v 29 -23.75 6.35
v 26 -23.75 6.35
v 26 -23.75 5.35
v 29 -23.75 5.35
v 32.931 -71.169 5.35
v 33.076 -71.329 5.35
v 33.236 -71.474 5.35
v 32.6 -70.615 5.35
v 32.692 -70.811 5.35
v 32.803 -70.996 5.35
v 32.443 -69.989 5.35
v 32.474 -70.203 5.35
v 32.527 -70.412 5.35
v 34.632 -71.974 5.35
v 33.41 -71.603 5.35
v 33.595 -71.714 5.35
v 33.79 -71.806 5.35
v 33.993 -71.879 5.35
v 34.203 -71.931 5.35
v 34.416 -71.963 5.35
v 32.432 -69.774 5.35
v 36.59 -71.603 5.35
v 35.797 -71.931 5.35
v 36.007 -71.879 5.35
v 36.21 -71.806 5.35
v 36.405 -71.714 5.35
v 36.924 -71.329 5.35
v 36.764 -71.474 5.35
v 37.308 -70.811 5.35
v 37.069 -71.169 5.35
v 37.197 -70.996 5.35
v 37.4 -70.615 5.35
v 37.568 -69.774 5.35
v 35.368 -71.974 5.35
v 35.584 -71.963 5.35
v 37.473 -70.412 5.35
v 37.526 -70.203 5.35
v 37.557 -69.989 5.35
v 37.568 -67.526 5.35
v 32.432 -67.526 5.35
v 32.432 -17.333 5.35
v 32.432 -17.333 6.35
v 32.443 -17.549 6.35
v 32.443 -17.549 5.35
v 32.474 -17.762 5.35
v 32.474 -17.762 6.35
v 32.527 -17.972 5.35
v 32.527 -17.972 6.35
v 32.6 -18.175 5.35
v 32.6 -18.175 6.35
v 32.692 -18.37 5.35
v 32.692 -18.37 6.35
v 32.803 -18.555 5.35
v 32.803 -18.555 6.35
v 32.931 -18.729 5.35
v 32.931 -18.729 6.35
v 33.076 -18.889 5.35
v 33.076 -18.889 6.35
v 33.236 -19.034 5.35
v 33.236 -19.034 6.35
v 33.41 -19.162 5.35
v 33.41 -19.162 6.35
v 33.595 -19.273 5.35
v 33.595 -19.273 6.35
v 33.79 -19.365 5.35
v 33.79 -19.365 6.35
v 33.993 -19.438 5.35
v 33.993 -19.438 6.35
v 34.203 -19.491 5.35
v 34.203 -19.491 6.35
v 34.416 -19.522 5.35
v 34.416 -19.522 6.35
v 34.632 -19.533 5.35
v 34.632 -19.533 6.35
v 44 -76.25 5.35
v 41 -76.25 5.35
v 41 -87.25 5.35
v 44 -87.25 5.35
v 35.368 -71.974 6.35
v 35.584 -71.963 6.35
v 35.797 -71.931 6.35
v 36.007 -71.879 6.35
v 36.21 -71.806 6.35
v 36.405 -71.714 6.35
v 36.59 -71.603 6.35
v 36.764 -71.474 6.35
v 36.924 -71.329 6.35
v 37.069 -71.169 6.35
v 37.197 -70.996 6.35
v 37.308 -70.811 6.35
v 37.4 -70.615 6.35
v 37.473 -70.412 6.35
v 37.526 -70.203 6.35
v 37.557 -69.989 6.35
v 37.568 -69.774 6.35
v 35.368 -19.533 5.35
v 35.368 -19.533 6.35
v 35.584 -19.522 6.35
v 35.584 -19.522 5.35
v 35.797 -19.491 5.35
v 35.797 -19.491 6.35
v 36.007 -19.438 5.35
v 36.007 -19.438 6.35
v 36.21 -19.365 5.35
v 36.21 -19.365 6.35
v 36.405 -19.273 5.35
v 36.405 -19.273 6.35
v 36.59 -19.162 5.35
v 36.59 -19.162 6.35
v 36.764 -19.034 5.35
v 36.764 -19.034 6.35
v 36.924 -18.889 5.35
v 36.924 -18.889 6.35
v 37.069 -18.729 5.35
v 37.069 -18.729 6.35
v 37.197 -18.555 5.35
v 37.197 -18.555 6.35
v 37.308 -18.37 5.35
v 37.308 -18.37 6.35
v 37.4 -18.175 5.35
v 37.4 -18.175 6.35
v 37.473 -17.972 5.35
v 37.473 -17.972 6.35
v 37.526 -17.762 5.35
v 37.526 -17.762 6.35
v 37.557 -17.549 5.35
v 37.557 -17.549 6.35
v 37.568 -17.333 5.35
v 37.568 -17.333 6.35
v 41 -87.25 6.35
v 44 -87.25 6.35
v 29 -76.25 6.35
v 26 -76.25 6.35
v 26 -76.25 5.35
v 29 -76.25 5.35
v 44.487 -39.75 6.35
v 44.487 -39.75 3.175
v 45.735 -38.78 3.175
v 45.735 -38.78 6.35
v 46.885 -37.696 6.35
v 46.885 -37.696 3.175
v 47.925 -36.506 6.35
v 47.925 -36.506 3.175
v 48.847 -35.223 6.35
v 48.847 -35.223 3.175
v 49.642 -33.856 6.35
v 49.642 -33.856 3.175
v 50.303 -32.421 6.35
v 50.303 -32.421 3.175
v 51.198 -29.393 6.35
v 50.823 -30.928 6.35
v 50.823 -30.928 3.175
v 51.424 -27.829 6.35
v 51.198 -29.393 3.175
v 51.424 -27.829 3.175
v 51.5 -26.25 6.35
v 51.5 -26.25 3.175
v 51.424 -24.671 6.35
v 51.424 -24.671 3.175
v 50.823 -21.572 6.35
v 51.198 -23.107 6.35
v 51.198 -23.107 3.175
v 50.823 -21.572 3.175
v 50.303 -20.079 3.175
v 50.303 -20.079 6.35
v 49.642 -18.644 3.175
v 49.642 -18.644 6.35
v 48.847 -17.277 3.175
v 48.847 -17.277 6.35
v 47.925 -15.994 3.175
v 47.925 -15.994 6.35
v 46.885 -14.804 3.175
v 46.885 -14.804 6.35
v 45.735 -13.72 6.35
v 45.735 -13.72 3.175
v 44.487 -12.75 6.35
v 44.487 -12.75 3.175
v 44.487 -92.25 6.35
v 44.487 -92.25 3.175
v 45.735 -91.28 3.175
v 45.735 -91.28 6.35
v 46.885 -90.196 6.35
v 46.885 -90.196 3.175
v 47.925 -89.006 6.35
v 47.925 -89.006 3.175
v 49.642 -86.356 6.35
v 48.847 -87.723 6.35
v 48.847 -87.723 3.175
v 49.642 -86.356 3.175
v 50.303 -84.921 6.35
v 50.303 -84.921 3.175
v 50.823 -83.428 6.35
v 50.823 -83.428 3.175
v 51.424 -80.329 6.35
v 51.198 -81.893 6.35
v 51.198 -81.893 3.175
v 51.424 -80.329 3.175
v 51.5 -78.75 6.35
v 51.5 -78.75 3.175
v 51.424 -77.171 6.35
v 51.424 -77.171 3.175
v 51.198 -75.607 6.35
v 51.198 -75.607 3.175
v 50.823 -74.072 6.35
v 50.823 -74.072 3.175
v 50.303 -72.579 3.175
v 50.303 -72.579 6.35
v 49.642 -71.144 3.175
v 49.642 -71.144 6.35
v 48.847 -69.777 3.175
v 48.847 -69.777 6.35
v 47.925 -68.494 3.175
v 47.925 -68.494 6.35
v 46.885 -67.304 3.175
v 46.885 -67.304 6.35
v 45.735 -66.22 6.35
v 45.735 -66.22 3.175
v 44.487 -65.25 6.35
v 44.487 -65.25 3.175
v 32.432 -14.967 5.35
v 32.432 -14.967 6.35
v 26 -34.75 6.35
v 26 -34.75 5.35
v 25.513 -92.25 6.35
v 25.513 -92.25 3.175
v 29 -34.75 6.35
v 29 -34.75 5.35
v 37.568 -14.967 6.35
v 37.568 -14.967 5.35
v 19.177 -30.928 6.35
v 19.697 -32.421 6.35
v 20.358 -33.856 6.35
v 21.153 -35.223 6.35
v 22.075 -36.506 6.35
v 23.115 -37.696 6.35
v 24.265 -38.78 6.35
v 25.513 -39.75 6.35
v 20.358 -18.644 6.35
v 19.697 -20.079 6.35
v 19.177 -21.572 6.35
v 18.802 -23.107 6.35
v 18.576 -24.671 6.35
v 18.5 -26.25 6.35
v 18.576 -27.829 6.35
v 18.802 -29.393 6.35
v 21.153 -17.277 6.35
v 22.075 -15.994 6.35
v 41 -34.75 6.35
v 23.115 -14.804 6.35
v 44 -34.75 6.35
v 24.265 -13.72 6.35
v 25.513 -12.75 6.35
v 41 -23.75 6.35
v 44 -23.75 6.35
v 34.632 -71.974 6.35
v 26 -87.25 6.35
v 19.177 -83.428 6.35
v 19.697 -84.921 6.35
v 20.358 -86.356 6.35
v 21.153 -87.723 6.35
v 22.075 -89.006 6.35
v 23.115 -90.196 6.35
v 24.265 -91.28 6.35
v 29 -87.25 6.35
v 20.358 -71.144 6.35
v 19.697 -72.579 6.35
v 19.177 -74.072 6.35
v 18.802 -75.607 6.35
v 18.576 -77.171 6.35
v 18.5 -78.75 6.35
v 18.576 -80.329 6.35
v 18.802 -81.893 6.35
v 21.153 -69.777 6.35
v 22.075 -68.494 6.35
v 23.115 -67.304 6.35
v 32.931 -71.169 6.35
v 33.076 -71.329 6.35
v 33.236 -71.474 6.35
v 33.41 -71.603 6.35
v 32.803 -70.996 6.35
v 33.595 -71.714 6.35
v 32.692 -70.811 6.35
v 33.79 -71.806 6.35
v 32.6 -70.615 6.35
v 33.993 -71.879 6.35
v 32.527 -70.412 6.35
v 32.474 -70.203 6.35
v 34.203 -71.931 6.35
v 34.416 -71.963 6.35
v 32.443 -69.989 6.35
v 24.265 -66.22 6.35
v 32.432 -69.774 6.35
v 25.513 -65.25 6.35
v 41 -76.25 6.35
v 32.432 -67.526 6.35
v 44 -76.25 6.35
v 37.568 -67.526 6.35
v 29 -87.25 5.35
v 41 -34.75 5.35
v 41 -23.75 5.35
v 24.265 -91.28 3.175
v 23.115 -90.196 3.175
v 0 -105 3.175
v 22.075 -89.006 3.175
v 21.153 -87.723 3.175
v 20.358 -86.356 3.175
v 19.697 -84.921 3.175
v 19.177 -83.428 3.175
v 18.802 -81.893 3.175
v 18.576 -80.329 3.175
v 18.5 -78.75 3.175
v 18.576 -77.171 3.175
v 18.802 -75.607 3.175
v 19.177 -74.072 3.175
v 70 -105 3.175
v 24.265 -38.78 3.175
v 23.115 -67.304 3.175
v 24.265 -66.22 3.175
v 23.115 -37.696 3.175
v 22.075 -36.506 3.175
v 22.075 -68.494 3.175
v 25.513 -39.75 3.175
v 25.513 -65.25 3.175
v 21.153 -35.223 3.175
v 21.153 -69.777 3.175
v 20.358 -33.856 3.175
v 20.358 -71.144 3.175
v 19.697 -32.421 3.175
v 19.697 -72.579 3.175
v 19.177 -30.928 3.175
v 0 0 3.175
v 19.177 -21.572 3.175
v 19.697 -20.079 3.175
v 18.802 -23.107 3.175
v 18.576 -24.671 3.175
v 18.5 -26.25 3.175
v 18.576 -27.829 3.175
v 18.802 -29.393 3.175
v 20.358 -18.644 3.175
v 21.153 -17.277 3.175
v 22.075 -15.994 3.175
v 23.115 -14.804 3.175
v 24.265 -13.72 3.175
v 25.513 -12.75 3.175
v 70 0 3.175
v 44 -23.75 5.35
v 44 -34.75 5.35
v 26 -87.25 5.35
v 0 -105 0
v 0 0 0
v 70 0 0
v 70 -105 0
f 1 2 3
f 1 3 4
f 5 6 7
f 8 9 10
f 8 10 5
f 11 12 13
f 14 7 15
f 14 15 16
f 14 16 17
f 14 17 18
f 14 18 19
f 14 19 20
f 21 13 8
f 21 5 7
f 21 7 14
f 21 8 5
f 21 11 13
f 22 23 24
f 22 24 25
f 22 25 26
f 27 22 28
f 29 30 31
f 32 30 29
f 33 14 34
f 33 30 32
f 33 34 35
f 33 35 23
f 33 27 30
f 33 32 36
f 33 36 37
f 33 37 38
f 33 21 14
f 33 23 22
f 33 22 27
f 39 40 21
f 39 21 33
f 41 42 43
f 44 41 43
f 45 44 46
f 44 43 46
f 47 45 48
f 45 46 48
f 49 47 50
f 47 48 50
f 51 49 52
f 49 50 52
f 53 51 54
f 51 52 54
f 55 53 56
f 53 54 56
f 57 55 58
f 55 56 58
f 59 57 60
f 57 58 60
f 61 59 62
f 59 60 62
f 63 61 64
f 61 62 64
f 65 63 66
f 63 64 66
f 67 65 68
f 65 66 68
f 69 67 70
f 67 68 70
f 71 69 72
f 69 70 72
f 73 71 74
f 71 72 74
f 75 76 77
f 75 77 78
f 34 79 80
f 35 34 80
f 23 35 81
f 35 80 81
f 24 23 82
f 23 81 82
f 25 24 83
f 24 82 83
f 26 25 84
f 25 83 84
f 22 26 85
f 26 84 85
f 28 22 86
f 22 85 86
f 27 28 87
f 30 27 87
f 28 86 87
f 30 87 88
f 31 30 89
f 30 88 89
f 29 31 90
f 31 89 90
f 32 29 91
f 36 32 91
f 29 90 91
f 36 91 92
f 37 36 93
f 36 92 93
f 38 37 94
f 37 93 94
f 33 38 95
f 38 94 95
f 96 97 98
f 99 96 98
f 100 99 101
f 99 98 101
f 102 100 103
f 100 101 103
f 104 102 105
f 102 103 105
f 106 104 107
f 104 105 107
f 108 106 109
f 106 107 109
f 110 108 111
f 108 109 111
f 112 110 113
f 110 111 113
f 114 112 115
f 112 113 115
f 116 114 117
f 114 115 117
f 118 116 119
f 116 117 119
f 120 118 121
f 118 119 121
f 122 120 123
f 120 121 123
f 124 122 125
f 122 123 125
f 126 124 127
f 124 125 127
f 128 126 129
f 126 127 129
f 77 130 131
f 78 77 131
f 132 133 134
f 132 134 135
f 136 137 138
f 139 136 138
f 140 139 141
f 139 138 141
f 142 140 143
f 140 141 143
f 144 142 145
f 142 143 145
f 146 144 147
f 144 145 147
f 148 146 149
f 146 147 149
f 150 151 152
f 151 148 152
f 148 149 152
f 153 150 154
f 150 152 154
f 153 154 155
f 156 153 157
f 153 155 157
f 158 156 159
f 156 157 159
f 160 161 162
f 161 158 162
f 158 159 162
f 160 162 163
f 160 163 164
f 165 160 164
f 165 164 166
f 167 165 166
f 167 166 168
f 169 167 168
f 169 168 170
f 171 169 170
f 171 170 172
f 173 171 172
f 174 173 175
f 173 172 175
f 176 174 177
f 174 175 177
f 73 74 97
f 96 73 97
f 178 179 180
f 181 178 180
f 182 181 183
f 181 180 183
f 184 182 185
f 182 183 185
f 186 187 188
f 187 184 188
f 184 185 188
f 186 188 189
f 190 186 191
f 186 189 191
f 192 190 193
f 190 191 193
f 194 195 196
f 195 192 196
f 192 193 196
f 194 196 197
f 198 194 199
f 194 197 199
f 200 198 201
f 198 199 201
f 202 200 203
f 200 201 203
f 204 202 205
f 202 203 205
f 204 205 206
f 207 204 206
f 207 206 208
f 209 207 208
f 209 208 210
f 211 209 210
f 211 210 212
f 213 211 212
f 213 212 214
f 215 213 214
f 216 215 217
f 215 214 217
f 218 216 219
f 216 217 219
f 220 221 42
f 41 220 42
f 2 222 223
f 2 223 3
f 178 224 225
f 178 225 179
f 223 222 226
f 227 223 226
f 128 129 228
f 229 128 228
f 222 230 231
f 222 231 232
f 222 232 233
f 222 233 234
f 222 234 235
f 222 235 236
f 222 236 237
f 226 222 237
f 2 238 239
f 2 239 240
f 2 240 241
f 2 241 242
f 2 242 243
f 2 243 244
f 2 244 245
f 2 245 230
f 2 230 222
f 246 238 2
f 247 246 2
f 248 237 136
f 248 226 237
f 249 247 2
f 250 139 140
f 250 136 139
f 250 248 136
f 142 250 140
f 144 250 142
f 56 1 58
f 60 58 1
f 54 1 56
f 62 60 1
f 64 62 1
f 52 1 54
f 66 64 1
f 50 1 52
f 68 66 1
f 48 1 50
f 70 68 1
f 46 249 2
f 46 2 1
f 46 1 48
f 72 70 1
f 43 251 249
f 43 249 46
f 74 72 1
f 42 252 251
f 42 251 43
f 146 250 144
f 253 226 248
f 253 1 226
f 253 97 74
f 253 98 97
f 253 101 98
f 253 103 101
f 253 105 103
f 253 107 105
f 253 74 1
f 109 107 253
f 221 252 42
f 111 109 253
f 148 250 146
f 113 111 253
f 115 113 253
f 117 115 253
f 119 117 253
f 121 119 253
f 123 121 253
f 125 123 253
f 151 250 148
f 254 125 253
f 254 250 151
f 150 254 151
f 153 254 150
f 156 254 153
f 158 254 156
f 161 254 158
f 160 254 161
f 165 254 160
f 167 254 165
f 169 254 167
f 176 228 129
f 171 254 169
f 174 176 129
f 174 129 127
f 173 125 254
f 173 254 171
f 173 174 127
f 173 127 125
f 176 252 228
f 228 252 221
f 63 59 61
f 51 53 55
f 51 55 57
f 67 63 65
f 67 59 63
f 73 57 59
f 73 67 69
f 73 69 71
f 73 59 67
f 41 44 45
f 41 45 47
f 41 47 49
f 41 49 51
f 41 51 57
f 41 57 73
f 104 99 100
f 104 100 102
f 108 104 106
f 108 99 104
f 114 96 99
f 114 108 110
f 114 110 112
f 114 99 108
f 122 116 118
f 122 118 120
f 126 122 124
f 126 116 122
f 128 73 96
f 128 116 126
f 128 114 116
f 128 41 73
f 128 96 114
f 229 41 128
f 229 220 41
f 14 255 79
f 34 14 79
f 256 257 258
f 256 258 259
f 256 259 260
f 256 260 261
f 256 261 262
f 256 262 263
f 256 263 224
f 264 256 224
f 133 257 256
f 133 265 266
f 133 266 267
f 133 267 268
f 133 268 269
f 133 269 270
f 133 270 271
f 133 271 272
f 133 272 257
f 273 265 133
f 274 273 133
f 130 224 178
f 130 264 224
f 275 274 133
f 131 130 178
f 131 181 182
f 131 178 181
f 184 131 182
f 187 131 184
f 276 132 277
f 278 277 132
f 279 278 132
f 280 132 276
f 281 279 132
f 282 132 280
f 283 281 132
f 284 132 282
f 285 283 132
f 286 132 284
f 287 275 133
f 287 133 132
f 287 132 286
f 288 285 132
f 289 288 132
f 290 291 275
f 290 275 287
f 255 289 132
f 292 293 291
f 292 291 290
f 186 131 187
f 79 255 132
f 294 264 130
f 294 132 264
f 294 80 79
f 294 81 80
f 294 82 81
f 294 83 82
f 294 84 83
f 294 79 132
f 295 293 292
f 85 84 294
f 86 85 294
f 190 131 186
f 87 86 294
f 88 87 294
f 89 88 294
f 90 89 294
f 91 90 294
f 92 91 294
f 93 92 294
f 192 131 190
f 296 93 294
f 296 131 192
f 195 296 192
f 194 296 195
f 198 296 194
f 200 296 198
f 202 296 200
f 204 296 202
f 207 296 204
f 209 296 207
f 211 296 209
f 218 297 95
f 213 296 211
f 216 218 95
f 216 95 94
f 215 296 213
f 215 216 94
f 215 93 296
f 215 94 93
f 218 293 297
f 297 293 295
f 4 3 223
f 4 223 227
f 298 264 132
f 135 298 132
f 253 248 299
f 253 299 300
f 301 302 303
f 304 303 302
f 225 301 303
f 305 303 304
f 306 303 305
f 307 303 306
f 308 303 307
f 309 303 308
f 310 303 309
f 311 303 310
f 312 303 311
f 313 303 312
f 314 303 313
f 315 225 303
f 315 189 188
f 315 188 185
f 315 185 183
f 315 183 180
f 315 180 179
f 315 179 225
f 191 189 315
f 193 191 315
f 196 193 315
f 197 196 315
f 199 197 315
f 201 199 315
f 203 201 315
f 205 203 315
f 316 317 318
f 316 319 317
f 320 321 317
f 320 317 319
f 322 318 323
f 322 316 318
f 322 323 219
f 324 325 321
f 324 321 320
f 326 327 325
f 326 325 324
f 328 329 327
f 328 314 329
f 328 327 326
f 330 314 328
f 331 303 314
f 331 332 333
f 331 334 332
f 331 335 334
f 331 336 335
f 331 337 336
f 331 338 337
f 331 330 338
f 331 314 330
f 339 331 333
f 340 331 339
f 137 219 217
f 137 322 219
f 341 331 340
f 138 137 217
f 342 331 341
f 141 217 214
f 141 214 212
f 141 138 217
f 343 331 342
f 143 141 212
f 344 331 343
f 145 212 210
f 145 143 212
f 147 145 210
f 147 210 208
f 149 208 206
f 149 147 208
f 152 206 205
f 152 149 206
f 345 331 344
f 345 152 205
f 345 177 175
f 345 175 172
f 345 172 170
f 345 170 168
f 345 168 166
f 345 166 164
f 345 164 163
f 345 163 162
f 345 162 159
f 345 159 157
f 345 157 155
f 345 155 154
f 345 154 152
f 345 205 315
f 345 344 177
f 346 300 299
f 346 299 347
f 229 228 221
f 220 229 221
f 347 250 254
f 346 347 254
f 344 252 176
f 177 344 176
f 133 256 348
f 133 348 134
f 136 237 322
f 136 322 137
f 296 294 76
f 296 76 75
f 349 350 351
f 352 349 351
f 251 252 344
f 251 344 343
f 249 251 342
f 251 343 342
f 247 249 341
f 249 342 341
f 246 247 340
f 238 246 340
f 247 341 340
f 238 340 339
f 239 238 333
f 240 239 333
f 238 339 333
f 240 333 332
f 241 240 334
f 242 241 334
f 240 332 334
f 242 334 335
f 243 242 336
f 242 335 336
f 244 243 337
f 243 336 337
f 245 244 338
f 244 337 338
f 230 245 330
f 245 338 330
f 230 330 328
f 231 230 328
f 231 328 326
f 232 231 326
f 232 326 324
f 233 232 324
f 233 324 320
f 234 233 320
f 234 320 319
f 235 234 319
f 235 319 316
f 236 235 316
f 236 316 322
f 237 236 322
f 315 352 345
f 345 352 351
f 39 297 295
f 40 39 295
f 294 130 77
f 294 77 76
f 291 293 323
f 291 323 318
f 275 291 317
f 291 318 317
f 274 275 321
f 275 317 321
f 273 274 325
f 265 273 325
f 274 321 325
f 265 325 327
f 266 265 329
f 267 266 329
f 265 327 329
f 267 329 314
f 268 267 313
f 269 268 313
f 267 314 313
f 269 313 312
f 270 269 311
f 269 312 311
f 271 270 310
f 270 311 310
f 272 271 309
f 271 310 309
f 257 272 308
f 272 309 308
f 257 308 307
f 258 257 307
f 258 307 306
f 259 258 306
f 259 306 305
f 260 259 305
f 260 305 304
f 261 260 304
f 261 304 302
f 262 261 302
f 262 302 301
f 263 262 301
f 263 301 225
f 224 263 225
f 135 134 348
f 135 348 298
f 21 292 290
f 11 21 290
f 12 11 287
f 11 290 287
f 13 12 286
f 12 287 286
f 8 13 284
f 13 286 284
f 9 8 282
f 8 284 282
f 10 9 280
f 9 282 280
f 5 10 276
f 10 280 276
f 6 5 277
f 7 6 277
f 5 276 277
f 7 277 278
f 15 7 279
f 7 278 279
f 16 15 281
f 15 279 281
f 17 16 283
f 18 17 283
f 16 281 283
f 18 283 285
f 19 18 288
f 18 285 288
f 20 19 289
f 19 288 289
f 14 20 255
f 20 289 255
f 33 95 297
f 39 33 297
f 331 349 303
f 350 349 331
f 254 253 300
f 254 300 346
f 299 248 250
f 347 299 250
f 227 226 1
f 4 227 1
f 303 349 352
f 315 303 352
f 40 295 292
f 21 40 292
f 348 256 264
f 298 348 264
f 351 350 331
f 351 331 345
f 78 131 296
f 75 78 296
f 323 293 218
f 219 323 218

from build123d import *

# Parameters (mm, degrees)
CROQUIS1_W              = 70
CROQUIS1_H              = 105
SALIENTE_EXTRUIR1_DEPTH = 3.175
CROQUIS2_R              = 16.5
SALIENTE_EXTRUIR2_DEPTH = 3.175
CROQUIS3_W              = 26
CROQUIS3_H              = 6
CORTAR_EXTRUIR1_DEPTH   = 3.175
CROQUIS4_W              = 3
CROQUIS4_H              = 11
CORTAR_EXTRUIR2_DEPTH   = 1


with BuildPart() as part:
    # Croquis1 → Saliente-Extruir1 (new body)
    with BuildSketch(Plane.XY):
        with Locations((35, -52.5)):
            Rectangle(CROQUIS1_W, CROQUIS1_H)
    extrude(amount=SALIENTE_EXTRUIR1_DEPTH)

    # Croquis2 → Saliente-Extruir2 (add)
    with BuildSketch(Plane.XY.offset(3.175)):
        with Locations((35, -26.25)):
            Circle(CROQUIS2_R)
        with Locations((35, -78.75)):
            Circle(CROQUIS2_R)
    extrude(amount=SALIENTE_EXTRUIR2_DEPTH)

    # Croquis3 → Cortar-Extruir1 (cut)
    with BuildSketch(Plane.XY.offset(6.35)):
        with Locations((35, -9.75)):
            Rectangle(CROQUIS3_W, CROQUIS3_H)
        with Locations((35, -42.75)):
            Rectangle(CROQUIS3_W, CROQUIS3_H)
        with Locations((35, -62.25)):
            Rectangle(CROQUIS3_W, CROQUIS3_H)
        with Locations((35, -95.25)):
            Rectangle(CROQUIS3_W, CROQUIS3_H)
    extrude(amount=-CORTAR_EXTRUIR1_DEPTH, mode=Mode.SUBTRACT)

    # Croquis4 → Cortar-Extruir2 (cut)
    with BuildSketch(Plane.XY.offset(6.35)):
        with Locations((27.5, -29.25)):
            Rectangle(CROQUIS4_W, CROQUIS4_H)
        with Locations((42.5, -29.25)):
            Rectangle(CROQUIS4_W, CROQUIS4_H)
        with BuildLine():
            Line((34.632057675, -19.532945654), (35.367942325, -19.532945654))
            ThreePointArc((35.367942325, -19.532945654), (36.923577244, -18.888580572), (37.567942325, -17.332945654))
            Line((37.567942325, -17.332945654), (37.567942325, -14.967054346))
            Line((37.567942325, -14.967054346), (32.432057675, -14.967054346))
            Line((32.432057675, -14.967054346), (32.432057675, -17.332945654))
            ThreePointArc((32.432057675, -17.332945654), (33.076422756, -18.888580572), (34.632057675, -19.532945654))
        make_face()
        with Locations((42.5, -81.75)):
            Rectangle(CROQUIS4_W, CROQUIS4_H)
        with Locations((27.5, -81.75)):
            Rectangle(CROQUIS4_W, CROQUIS4_H)
        with BuildLine():
            Line((34.632057675, -71.973579429), (35.367942325, -71.973579429))
            ThreePointArc((35.367942325, -71.973579429), (36.923577244, -71.329214348), (37.567942325, -69.773579429))
            Line((37.567942325, -69.773579429), (37.567942325, -67.526420571))
            Line((37.567942325, -67.526420571), (32.432057675, -67.526420571))
            Line((32.432057675, -67.526420571), (32.432057675, -69.773579429))
            ThreePointArc((32.432057675, -69.773579429), (33.076422756, -71.329214348), (34.632057675, -71.973579429))
        make_face()
    extrude(amount=-CORTAR_EXTRUIR2_DEPTH, mode=Mode.SUBTRACT)


solid = part.part
